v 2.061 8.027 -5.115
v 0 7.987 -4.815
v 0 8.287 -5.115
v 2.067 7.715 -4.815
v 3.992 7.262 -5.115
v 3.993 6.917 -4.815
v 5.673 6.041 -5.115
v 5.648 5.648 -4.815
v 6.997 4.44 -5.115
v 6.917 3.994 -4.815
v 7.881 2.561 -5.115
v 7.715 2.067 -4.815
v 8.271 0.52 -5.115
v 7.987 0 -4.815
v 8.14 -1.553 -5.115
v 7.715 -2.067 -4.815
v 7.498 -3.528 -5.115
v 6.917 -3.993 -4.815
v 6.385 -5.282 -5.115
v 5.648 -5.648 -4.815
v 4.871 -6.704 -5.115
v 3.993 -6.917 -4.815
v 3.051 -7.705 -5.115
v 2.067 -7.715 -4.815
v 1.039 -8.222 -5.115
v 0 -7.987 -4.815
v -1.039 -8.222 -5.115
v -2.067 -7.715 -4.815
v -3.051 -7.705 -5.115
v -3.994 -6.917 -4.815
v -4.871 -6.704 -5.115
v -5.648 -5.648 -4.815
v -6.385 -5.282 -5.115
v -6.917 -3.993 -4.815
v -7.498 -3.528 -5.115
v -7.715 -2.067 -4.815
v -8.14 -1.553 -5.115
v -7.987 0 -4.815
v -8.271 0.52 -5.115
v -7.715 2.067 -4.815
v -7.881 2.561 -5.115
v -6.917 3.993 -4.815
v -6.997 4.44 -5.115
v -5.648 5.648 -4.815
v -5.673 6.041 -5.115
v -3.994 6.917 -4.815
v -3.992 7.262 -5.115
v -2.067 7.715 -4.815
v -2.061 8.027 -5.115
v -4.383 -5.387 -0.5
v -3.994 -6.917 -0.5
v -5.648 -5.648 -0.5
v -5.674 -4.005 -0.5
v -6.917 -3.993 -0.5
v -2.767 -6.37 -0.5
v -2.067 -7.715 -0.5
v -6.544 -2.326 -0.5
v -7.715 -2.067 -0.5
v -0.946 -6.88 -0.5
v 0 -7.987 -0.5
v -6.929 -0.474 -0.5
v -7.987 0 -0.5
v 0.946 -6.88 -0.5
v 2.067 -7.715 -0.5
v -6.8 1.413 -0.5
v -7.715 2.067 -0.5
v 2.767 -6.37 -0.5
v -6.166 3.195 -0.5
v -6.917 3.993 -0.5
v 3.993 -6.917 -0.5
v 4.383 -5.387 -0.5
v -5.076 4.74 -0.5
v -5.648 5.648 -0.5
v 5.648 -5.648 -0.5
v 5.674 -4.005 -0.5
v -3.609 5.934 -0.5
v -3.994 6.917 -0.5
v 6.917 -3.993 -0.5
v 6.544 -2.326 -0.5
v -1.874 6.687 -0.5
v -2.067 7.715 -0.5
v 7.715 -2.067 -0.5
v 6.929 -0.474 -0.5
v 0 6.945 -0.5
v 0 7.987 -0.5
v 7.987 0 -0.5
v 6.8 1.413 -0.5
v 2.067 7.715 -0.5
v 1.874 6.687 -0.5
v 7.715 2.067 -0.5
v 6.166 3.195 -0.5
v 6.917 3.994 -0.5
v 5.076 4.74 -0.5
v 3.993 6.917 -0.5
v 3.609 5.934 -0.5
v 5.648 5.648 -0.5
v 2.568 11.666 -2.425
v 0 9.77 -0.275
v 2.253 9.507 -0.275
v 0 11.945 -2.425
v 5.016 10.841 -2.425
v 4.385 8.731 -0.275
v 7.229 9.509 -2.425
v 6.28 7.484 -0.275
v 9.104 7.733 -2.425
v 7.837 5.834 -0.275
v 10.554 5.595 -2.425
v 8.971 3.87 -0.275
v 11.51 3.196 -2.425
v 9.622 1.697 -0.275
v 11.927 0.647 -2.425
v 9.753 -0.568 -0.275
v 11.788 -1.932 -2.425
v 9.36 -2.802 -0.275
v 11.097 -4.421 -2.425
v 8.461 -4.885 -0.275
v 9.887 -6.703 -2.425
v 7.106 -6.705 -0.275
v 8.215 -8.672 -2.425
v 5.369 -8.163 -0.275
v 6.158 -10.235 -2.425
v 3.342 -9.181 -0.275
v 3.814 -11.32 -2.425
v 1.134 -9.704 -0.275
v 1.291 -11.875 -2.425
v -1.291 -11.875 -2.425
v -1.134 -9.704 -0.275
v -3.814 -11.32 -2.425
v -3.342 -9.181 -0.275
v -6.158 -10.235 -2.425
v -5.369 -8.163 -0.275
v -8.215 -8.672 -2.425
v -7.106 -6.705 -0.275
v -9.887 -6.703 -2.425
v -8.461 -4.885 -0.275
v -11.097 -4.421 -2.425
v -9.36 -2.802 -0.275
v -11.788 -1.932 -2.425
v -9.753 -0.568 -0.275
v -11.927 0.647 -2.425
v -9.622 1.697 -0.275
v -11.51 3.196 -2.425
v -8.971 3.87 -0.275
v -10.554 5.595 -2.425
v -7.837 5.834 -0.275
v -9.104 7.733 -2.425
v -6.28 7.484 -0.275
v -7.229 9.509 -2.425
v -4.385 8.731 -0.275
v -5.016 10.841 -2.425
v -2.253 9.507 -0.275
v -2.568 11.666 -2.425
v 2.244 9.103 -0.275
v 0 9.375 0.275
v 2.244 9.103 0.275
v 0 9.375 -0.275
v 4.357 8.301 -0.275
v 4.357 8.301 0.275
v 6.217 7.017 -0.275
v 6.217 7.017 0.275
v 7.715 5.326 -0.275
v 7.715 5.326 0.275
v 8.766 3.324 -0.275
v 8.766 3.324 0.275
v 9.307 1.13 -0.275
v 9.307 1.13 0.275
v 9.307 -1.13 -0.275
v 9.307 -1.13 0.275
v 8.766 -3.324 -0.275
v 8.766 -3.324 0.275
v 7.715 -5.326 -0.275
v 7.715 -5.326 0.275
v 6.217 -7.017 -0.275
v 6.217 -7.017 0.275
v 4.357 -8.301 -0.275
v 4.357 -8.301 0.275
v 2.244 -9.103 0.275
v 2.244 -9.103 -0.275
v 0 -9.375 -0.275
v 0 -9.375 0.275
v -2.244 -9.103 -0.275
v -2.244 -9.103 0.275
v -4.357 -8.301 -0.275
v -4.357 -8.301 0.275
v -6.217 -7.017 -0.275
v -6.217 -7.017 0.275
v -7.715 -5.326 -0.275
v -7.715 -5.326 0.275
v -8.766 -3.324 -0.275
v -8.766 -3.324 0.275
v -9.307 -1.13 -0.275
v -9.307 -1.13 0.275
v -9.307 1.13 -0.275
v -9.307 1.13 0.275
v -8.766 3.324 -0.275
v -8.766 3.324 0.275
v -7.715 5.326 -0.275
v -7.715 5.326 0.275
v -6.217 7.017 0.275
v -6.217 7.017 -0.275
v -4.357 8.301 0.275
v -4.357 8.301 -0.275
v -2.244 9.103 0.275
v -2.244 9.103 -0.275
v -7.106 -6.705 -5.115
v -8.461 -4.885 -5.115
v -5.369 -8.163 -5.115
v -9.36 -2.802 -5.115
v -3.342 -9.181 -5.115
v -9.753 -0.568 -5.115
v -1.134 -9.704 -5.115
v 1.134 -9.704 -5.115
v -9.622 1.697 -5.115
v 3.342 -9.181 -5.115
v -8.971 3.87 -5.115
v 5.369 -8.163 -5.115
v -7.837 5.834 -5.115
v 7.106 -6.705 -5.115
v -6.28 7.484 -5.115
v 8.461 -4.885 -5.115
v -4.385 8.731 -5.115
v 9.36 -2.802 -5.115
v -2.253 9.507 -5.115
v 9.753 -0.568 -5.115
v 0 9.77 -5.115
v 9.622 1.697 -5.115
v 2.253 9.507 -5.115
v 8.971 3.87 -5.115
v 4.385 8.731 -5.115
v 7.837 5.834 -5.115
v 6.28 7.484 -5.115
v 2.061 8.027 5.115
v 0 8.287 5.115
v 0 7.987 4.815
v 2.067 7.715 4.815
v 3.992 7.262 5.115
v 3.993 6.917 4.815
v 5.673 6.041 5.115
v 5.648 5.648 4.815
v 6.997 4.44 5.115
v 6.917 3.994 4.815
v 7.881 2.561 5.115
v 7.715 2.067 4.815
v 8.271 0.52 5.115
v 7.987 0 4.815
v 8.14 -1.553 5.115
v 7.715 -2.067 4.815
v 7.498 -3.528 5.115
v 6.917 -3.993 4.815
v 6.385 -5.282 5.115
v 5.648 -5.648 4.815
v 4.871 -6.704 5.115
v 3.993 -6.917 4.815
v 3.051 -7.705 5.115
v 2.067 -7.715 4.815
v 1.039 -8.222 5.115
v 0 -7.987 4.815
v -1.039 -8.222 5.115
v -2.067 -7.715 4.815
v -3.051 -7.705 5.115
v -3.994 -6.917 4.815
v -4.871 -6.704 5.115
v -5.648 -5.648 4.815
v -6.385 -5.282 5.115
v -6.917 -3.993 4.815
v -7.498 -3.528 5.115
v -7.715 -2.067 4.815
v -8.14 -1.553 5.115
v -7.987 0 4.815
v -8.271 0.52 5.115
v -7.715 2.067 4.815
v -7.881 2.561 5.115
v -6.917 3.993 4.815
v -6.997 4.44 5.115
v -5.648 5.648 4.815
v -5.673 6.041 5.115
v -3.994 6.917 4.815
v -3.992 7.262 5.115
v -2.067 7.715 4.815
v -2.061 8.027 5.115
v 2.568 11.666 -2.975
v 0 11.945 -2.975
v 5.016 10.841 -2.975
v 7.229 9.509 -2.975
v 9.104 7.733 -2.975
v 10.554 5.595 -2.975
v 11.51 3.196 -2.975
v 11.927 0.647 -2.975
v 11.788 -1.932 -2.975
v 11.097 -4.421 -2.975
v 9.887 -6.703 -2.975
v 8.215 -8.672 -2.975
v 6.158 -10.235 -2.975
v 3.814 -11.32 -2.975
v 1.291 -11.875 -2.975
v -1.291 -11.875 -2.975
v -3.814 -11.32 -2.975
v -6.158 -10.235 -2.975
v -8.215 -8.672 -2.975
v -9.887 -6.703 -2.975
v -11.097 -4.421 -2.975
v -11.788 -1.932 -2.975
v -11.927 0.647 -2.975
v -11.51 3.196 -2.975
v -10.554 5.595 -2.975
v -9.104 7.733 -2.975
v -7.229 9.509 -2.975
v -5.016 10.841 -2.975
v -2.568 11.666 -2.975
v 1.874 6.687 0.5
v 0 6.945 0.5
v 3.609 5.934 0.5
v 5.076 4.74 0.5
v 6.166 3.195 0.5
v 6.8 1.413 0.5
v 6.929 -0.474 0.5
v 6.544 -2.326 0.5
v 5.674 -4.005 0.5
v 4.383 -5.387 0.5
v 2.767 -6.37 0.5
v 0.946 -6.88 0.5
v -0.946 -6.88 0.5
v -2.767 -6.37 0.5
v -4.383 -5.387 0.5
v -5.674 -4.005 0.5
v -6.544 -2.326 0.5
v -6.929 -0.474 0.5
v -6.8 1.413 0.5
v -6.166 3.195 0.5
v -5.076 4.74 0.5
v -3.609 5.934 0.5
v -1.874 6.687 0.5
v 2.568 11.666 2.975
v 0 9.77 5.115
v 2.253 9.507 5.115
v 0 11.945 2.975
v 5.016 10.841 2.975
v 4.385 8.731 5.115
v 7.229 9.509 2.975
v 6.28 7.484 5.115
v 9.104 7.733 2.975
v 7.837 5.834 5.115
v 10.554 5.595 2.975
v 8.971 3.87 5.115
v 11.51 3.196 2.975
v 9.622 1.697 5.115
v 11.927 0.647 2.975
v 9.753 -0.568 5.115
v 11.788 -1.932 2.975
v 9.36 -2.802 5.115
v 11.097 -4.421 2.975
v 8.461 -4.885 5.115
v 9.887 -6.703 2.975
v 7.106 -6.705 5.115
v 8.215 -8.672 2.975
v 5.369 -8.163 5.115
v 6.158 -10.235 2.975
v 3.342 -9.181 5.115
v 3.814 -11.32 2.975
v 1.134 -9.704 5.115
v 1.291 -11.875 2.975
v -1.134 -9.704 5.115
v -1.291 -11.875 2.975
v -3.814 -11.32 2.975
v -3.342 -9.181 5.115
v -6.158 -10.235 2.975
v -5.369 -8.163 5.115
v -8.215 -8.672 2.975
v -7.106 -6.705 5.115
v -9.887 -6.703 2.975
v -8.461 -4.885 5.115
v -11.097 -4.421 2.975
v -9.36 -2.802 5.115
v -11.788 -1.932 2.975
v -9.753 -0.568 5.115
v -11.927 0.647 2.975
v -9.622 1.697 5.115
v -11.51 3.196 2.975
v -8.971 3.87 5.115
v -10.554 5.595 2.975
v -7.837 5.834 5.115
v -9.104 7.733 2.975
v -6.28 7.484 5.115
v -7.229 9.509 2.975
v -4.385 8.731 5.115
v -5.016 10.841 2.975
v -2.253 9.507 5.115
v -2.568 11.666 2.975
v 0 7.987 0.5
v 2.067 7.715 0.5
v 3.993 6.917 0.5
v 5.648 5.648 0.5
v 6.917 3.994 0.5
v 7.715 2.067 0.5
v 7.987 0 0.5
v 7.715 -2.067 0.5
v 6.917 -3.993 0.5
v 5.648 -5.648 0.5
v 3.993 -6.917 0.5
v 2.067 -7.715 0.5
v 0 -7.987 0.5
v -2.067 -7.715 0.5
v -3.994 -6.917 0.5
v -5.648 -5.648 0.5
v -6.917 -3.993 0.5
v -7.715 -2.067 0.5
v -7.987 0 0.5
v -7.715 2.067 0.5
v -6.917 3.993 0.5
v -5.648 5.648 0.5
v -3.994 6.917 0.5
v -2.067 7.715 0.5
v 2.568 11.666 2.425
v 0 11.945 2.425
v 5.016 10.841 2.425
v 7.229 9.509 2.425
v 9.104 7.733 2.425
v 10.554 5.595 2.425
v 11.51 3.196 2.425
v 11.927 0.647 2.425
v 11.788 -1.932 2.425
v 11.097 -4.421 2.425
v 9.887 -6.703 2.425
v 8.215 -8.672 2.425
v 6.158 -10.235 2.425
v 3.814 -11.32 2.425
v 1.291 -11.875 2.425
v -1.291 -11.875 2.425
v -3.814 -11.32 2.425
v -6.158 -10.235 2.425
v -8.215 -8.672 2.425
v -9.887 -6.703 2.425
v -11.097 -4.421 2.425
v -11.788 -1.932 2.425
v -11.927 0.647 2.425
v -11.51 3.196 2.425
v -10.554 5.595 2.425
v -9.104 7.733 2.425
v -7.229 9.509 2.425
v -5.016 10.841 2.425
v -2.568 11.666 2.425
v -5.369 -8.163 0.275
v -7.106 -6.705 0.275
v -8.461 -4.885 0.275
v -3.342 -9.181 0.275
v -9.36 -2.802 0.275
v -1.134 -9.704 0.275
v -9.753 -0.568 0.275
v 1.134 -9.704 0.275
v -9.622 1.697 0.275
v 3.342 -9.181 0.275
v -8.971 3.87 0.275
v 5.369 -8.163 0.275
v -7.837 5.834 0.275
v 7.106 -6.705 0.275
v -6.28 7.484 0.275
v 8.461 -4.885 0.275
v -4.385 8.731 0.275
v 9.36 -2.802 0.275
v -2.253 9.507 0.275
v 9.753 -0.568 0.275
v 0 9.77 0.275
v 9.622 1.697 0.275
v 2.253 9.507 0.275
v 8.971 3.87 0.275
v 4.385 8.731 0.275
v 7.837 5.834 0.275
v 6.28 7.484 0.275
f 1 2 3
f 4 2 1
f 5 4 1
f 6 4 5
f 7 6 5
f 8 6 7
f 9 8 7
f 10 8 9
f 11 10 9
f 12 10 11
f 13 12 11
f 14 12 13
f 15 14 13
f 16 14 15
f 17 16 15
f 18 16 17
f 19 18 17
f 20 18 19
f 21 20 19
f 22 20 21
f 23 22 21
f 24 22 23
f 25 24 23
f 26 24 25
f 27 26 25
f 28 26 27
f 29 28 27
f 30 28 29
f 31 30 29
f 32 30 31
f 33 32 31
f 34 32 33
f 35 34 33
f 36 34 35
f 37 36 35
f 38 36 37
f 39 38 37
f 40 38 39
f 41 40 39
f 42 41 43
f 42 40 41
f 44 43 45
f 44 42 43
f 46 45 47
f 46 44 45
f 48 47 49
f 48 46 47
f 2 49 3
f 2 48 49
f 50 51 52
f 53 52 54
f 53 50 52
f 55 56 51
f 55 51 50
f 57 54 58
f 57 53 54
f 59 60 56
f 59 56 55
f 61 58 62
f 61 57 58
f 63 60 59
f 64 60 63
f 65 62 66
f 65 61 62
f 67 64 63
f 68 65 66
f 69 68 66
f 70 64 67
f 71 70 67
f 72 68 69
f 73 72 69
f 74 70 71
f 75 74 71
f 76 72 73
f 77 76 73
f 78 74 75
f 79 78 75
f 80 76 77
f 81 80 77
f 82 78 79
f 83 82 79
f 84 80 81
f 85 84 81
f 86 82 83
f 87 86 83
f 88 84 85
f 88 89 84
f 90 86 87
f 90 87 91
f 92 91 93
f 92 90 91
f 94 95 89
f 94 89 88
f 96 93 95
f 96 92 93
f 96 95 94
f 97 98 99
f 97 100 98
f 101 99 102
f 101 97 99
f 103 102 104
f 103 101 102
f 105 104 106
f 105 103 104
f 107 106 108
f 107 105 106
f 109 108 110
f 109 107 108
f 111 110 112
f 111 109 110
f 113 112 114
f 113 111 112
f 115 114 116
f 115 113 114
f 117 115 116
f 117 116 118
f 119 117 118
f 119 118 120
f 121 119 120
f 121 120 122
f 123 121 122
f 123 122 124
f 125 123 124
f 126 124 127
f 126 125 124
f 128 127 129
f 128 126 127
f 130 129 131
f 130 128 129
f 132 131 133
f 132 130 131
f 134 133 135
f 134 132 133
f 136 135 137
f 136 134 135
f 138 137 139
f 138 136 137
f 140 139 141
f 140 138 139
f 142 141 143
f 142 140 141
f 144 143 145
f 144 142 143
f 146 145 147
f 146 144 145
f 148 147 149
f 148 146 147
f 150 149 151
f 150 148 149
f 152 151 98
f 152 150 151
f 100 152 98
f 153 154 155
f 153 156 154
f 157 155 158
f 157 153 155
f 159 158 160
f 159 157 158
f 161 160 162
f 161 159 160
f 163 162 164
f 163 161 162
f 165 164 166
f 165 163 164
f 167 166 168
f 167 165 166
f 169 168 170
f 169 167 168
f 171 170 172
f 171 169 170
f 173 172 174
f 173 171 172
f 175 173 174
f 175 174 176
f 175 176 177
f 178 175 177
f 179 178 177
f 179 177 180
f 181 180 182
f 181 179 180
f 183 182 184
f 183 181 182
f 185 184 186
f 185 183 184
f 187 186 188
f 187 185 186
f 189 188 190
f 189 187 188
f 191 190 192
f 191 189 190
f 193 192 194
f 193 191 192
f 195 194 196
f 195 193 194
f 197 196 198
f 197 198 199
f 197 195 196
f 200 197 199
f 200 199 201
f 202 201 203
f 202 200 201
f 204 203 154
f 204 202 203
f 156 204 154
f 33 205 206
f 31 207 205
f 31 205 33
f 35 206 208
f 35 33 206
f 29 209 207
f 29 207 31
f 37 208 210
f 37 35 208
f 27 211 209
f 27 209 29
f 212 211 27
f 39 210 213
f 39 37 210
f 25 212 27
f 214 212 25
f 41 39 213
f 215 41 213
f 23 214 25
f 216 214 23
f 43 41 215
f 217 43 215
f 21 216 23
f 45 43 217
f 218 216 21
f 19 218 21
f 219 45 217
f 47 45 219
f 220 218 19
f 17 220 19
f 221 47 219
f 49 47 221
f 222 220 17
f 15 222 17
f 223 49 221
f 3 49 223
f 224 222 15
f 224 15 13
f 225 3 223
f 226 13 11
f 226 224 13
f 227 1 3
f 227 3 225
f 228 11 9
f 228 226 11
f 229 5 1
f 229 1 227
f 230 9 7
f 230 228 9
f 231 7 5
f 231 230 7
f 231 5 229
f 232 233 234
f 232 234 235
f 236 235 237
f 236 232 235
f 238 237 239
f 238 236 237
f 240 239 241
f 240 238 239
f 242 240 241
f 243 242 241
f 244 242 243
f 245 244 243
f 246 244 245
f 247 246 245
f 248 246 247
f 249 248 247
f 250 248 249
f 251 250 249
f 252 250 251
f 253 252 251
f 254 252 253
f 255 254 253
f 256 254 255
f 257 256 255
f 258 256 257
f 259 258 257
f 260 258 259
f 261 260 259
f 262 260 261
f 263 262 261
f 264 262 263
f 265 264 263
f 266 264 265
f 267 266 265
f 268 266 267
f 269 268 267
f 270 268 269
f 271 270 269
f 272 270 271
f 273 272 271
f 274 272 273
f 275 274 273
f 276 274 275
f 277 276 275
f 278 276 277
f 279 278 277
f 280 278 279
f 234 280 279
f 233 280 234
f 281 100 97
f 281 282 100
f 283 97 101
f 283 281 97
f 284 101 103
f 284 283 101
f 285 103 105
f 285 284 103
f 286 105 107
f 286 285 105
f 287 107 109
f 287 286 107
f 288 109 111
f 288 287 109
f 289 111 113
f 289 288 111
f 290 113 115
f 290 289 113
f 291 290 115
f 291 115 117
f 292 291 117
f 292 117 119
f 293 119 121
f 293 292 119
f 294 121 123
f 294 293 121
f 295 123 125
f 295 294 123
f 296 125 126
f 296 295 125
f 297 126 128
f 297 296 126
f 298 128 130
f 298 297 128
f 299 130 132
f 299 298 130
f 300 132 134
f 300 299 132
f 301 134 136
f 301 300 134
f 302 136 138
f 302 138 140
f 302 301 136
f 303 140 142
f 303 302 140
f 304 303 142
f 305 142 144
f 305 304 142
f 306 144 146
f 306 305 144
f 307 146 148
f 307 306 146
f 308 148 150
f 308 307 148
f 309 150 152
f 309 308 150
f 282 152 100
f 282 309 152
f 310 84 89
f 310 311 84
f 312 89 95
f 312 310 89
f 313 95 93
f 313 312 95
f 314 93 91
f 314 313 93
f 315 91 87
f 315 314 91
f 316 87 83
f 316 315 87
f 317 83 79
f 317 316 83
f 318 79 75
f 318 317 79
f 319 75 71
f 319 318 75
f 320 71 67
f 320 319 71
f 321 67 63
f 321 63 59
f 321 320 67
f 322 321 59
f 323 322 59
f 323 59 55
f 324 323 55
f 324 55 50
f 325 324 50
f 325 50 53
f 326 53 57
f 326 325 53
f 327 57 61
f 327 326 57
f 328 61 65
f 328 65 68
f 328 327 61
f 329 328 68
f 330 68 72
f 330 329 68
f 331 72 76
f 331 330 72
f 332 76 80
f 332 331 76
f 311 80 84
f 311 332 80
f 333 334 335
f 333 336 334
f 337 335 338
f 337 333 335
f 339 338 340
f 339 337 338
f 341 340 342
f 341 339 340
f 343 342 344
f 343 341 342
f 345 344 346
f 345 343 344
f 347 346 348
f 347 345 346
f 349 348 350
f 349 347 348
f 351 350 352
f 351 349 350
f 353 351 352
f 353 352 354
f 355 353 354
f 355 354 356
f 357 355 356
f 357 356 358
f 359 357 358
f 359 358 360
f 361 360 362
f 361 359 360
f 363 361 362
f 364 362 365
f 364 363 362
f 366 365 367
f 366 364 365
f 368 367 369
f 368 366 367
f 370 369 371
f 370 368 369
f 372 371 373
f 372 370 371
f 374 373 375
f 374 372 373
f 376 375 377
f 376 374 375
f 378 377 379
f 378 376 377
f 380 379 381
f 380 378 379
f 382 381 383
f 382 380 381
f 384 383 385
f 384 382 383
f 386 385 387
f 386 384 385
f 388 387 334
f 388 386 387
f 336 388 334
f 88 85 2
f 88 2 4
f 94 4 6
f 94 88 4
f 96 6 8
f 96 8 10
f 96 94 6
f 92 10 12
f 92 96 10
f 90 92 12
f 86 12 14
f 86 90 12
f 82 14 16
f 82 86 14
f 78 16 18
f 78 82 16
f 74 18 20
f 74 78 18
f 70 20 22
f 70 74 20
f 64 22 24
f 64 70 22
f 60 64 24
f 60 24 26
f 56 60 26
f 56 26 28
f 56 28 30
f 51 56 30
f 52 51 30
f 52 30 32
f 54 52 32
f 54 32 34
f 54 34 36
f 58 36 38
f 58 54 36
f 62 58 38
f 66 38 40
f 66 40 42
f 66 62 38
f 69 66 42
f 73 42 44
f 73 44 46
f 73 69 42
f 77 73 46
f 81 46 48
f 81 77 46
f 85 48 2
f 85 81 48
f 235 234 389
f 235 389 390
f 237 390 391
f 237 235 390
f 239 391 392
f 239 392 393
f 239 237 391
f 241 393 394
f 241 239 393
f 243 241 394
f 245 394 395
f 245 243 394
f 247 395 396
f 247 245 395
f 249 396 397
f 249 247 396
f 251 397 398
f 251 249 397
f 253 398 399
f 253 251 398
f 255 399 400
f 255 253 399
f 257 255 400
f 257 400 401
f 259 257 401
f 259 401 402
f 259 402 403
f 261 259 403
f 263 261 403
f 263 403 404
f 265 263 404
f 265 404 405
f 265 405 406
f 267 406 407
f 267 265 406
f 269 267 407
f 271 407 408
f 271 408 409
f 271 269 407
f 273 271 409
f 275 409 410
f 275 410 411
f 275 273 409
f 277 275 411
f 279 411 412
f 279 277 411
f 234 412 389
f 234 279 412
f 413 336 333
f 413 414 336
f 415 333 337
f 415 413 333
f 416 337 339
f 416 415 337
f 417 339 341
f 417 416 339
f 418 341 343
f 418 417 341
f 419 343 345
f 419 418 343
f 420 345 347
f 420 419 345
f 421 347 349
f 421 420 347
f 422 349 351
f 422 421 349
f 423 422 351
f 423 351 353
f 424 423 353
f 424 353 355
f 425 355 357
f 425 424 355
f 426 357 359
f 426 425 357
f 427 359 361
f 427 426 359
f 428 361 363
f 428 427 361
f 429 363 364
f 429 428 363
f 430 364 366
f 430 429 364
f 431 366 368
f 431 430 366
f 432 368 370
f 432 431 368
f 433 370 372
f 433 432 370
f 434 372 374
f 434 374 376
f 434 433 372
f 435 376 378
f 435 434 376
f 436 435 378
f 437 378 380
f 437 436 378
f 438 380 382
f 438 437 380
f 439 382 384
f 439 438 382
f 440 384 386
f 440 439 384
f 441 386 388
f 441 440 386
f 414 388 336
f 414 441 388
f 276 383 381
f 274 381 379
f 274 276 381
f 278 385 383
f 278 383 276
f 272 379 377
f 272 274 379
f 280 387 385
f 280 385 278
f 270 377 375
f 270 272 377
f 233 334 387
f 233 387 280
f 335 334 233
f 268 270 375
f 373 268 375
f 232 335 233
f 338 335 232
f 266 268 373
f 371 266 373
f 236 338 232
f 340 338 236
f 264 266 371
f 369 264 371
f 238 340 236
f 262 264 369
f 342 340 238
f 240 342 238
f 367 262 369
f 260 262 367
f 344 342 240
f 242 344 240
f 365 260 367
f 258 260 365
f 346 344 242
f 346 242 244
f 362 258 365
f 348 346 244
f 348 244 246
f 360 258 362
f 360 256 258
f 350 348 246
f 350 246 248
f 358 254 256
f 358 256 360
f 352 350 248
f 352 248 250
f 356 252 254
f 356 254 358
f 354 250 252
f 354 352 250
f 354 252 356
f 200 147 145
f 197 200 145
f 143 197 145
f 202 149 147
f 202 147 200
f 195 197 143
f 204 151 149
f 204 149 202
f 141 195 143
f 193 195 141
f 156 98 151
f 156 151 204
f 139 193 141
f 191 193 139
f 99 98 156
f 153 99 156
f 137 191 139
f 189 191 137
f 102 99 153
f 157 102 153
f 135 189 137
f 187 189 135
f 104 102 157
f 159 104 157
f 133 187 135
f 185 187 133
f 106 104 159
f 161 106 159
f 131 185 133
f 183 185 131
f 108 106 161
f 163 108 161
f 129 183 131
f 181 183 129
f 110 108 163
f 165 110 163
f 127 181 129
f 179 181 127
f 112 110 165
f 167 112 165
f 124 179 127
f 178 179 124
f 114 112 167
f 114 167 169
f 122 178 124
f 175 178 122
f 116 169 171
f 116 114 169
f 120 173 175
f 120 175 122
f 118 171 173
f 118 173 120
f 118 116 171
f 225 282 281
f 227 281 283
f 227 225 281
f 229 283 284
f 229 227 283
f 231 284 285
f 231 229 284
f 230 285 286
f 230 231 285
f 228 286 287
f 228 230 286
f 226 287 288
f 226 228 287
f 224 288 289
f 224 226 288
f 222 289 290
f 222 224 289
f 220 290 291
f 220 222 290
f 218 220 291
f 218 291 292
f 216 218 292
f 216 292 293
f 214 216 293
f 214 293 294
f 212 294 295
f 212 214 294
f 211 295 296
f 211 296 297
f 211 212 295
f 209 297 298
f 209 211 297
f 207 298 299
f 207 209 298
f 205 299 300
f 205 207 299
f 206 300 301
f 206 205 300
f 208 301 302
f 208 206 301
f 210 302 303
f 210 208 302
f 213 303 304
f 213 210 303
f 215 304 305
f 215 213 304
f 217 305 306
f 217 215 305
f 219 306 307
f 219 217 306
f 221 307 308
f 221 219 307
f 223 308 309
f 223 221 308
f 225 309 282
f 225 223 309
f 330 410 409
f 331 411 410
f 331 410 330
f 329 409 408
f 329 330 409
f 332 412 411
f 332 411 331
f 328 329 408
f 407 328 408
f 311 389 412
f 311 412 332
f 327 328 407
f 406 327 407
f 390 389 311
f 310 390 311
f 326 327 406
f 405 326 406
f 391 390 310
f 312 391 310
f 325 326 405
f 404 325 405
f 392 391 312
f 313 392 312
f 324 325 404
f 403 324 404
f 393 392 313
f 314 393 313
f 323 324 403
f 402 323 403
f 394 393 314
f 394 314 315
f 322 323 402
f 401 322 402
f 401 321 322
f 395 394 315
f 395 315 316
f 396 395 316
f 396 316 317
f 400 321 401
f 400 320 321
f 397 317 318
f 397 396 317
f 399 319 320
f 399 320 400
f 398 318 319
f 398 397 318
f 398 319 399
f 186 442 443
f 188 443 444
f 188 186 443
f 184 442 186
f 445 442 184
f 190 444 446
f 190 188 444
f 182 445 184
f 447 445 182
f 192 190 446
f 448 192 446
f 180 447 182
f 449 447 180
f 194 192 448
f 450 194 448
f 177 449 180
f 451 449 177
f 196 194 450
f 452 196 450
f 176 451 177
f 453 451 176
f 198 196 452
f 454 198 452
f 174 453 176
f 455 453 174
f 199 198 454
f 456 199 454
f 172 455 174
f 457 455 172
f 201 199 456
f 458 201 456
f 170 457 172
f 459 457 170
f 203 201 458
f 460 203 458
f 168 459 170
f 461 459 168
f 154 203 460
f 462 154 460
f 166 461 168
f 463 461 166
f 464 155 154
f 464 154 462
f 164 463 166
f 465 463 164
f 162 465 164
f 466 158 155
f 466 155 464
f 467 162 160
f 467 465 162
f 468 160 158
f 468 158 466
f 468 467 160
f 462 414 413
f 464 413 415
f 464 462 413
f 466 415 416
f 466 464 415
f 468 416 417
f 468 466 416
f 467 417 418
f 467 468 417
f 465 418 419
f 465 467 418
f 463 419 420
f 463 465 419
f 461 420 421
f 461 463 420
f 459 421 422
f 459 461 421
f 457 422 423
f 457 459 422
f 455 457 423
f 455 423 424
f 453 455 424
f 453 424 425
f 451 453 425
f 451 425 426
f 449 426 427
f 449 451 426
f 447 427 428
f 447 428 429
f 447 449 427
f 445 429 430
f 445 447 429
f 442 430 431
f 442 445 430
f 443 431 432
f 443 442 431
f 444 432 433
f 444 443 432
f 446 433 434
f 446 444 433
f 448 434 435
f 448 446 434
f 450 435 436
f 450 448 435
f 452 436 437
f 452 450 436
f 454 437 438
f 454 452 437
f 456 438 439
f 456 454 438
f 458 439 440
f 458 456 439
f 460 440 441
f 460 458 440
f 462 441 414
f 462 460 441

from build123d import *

# Parameters (mm, degrees)
CHAMFER1_SIZE = 0.3


with BuildPart() as part:
    # Sketch1 → Revolve1 (revolve)
    with BuildSketch(Plane(origin=(0, 0, 0), x_dir=(0, 0, -1), z_dir=(1, 0, 0))):
        Polygon((-2.975, 11.945), (-2.425, 11.945), (-0.275, 9.77), (-0.275, 9.375), (0.275, 9.375), (0.275, 9.77), (2.425, 11.945), (2.975, 11.945), (5.115, 9.77), (5.115, 7.987), (0.5, 7.987), (0.5, 6.945), (-0.5, 6.945), (-0.5, 7.987), (-5.115, 7.987), (-5.115, 9.77), align=None)
    revolve(axis=Axis((0, 0, 5.115), (0, 0, -1)))

    # Chamfer1
    chamfer1_edges = [part.edges().sort_by_distance(p)[0] for p in [
        (0, -7.987, -5.115),
        (0, -7.987, 5.115),
    ]]
    chamfer(chamfer1_edges, length=CHAMFER1_SIZE)


solid = part.part
